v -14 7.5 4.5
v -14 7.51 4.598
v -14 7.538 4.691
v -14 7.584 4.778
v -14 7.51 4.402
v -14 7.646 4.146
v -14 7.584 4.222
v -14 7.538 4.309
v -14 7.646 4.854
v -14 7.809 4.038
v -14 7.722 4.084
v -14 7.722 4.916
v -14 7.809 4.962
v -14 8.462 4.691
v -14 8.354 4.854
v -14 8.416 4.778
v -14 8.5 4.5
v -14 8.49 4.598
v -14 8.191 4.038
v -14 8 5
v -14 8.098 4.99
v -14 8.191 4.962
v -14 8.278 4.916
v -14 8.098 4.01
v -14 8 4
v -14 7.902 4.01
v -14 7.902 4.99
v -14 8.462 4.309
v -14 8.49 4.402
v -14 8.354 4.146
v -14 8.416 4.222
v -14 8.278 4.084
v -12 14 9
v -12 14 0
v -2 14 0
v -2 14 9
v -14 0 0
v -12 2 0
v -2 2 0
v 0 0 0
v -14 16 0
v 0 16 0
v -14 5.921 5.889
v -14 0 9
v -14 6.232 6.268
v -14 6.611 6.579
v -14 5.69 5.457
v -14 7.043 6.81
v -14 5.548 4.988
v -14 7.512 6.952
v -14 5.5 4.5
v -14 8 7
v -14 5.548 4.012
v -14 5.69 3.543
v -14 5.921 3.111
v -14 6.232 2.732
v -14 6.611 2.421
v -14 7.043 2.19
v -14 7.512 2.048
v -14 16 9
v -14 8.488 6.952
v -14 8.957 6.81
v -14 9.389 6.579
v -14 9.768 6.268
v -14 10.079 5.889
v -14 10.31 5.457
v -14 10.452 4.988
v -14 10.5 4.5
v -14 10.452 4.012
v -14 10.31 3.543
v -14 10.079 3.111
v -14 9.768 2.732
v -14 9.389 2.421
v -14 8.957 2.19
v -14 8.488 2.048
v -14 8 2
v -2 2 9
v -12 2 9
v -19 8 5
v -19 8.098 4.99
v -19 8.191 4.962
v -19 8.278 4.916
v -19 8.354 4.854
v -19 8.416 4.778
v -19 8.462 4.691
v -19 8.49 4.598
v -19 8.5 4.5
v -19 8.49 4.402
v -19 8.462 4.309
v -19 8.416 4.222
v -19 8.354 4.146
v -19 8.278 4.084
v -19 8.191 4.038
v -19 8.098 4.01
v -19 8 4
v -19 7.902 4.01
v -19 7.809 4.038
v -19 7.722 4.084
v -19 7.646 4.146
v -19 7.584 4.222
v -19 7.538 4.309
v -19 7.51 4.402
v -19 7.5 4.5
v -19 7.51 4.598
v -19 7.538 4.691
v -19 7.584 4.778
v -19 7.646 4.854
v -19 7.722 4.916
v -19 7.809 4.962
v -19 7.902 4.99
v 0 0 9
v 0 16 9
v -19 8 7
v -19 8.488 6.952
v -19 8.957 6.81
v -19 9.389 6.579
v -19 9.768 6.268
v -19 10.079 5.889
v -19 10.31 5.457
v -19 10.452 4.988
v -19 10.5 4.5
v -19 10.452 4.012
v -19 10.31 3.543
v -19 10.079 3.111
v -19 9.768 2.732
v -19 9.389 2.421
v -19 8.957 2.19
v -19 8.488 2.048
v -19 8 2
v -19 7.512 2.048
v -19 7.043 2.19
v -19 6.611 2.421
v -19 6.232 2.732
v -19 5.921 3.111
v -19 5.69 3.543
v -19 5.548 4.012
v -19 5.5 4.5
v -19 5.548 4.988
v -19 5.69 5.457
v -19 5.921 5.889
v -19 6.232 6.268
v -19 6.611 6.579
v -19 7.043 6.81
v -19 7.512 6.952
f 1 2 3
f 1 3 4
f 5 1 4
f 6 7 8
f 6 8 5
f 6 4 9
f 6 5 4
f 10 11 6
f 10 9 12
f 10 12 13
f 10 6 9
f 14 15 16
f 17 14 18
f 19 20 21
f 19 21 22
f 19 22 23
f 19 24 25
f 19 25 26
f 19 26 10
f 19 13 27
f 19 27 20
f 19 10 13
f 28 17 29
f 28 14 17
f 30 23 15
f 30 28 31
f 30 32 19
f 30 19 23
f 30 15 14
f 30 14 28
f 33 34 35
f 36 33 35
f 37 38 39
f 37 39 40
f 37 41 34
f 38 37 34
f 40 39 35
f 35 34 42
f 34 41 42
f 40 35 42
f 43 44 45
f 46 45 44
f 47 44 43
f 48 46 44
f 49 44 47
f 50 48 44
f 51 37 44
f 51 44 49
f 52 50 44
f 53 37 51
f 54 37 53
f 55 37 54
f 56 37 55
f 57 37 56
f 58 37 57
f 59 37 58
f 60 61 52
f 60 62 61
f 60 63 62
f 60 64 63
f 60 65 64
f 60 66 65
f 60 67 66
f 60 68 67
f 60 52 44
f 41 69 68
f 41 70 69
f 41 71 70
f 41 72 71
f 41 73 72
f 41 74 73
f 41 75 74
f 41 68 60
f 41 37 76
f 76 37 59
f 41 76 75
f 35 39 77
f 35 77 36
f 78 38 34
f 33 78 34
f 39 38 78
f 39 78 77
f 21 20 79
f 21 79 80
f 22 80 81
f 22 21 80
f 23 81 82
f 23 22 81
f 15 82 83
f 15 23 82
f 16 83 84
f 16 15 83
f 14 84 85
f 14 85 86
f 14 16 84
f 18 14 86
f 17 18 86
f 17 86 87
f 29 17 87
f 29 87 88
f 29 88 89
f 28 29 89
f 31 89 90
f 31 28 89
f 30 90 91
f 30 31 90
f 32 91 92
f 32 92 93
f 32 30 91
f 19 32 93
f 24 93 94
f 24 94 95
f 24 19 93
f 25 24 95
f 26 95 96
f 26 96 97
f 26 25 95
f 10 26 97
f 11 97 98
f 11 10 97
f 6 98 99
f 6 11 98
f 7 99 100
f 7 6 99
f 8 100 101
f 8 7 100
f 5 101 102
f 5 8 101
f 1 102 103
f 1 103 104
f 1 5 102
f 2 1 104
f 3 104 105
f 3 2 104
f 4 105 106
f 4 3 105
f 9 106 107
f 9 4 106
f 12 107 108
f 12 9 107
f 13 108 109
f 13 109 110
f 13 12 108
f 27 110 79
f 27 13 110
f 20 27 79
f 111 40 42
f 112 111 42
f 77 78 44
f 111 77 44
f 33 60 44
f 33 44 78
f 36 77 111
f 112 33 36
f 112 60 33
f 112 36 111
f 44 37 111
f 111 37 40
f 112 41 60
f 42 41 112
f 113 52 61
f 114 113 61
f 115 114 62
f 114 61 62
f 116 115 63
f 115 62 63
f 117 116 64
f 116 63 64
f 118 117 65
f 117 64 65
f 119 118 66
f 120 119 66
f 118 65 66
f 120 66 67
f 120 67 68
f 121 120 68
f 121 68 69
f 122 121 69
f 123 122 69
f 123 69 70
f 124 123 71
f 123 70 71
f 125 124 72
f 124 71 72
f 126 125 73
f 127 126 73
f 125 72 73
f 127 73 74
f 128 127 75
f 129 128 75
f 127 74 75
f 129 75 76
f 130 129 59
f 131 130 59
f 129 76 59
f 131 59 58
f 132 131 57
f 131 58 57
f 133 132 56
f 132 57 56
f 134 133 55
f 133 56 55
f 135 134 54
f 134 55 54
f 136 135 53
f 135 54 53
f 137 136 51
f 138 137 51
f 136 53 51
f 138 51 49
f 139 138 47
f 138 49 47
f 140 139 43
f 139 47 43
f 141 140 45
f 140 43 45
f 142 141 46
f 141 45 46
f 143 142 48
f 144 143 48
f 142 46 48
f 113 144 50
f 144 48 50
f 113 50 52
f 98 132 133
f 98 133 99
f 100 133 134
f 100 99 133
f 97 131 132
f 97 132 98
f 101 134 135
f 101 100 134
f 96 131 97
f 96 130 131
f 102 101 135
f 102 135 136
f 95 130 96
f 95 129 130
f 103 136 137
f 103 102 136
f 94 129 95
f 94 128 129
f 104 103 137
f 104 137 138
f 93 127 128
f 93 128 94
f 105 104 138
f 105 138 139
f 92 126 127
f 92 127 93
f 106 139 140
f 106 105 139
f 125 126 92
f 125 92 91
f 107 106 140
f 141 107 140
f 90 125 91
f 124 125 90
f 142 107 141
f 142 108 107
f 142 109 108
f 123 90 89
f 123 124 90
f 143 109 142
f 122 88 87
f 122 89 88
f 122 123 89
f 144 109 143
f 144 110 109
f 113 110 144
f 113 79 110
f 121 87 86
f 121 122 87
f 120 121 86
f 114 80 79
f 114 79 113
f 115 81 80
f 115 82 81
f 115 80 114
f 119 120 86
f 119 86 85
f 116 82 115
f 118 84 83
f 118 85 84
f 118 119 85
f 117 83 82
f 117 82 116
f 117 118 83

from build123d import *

# Parameters (mm, degrees)
SKETCH1_W           = 14
SKETCH1_H           = 16
SKETCH1_W_2         = 10
SKETCH1_H_2         = 12
BOSS_EXTRUDE1_DEPTH = 9
SKETCH2_R           = 2.5
SKETCH2_R_2         = 0.5
BOSS_EXTRUDE2_DEPTH = 5


with BuildPart() as part:
    # Sketch1 → Boss-Extrude1 (new body)
    with BuildSketch(Plane.XY):
        with Locations((-7, 8)):
            Rectangle(SKETCH1_W, SKETCH1_H)
        with Locations((-7, 8)):
            Rectangle(SKETCH1_W_2, SKETCH1_H_2, mode=Mode.SUBTRACT)
    extrude(amount=BOSS_EXTRUDE1_DEPTH)

    # Sketch2 → Boss-Extrude2 (add)
    with BuildSketch(Plane.ZY.offset(14)):
        with Locations((4.5, 8)):
            Circle(SKETCH2_R)
        with Locations((4.5, 8)):
            Circle(SKETCH2_R_2, mode=Mode.SUBTRACT)
    extrude(amount=BOSS_EXTRUDE2_DEPTH)


solid = part.part
